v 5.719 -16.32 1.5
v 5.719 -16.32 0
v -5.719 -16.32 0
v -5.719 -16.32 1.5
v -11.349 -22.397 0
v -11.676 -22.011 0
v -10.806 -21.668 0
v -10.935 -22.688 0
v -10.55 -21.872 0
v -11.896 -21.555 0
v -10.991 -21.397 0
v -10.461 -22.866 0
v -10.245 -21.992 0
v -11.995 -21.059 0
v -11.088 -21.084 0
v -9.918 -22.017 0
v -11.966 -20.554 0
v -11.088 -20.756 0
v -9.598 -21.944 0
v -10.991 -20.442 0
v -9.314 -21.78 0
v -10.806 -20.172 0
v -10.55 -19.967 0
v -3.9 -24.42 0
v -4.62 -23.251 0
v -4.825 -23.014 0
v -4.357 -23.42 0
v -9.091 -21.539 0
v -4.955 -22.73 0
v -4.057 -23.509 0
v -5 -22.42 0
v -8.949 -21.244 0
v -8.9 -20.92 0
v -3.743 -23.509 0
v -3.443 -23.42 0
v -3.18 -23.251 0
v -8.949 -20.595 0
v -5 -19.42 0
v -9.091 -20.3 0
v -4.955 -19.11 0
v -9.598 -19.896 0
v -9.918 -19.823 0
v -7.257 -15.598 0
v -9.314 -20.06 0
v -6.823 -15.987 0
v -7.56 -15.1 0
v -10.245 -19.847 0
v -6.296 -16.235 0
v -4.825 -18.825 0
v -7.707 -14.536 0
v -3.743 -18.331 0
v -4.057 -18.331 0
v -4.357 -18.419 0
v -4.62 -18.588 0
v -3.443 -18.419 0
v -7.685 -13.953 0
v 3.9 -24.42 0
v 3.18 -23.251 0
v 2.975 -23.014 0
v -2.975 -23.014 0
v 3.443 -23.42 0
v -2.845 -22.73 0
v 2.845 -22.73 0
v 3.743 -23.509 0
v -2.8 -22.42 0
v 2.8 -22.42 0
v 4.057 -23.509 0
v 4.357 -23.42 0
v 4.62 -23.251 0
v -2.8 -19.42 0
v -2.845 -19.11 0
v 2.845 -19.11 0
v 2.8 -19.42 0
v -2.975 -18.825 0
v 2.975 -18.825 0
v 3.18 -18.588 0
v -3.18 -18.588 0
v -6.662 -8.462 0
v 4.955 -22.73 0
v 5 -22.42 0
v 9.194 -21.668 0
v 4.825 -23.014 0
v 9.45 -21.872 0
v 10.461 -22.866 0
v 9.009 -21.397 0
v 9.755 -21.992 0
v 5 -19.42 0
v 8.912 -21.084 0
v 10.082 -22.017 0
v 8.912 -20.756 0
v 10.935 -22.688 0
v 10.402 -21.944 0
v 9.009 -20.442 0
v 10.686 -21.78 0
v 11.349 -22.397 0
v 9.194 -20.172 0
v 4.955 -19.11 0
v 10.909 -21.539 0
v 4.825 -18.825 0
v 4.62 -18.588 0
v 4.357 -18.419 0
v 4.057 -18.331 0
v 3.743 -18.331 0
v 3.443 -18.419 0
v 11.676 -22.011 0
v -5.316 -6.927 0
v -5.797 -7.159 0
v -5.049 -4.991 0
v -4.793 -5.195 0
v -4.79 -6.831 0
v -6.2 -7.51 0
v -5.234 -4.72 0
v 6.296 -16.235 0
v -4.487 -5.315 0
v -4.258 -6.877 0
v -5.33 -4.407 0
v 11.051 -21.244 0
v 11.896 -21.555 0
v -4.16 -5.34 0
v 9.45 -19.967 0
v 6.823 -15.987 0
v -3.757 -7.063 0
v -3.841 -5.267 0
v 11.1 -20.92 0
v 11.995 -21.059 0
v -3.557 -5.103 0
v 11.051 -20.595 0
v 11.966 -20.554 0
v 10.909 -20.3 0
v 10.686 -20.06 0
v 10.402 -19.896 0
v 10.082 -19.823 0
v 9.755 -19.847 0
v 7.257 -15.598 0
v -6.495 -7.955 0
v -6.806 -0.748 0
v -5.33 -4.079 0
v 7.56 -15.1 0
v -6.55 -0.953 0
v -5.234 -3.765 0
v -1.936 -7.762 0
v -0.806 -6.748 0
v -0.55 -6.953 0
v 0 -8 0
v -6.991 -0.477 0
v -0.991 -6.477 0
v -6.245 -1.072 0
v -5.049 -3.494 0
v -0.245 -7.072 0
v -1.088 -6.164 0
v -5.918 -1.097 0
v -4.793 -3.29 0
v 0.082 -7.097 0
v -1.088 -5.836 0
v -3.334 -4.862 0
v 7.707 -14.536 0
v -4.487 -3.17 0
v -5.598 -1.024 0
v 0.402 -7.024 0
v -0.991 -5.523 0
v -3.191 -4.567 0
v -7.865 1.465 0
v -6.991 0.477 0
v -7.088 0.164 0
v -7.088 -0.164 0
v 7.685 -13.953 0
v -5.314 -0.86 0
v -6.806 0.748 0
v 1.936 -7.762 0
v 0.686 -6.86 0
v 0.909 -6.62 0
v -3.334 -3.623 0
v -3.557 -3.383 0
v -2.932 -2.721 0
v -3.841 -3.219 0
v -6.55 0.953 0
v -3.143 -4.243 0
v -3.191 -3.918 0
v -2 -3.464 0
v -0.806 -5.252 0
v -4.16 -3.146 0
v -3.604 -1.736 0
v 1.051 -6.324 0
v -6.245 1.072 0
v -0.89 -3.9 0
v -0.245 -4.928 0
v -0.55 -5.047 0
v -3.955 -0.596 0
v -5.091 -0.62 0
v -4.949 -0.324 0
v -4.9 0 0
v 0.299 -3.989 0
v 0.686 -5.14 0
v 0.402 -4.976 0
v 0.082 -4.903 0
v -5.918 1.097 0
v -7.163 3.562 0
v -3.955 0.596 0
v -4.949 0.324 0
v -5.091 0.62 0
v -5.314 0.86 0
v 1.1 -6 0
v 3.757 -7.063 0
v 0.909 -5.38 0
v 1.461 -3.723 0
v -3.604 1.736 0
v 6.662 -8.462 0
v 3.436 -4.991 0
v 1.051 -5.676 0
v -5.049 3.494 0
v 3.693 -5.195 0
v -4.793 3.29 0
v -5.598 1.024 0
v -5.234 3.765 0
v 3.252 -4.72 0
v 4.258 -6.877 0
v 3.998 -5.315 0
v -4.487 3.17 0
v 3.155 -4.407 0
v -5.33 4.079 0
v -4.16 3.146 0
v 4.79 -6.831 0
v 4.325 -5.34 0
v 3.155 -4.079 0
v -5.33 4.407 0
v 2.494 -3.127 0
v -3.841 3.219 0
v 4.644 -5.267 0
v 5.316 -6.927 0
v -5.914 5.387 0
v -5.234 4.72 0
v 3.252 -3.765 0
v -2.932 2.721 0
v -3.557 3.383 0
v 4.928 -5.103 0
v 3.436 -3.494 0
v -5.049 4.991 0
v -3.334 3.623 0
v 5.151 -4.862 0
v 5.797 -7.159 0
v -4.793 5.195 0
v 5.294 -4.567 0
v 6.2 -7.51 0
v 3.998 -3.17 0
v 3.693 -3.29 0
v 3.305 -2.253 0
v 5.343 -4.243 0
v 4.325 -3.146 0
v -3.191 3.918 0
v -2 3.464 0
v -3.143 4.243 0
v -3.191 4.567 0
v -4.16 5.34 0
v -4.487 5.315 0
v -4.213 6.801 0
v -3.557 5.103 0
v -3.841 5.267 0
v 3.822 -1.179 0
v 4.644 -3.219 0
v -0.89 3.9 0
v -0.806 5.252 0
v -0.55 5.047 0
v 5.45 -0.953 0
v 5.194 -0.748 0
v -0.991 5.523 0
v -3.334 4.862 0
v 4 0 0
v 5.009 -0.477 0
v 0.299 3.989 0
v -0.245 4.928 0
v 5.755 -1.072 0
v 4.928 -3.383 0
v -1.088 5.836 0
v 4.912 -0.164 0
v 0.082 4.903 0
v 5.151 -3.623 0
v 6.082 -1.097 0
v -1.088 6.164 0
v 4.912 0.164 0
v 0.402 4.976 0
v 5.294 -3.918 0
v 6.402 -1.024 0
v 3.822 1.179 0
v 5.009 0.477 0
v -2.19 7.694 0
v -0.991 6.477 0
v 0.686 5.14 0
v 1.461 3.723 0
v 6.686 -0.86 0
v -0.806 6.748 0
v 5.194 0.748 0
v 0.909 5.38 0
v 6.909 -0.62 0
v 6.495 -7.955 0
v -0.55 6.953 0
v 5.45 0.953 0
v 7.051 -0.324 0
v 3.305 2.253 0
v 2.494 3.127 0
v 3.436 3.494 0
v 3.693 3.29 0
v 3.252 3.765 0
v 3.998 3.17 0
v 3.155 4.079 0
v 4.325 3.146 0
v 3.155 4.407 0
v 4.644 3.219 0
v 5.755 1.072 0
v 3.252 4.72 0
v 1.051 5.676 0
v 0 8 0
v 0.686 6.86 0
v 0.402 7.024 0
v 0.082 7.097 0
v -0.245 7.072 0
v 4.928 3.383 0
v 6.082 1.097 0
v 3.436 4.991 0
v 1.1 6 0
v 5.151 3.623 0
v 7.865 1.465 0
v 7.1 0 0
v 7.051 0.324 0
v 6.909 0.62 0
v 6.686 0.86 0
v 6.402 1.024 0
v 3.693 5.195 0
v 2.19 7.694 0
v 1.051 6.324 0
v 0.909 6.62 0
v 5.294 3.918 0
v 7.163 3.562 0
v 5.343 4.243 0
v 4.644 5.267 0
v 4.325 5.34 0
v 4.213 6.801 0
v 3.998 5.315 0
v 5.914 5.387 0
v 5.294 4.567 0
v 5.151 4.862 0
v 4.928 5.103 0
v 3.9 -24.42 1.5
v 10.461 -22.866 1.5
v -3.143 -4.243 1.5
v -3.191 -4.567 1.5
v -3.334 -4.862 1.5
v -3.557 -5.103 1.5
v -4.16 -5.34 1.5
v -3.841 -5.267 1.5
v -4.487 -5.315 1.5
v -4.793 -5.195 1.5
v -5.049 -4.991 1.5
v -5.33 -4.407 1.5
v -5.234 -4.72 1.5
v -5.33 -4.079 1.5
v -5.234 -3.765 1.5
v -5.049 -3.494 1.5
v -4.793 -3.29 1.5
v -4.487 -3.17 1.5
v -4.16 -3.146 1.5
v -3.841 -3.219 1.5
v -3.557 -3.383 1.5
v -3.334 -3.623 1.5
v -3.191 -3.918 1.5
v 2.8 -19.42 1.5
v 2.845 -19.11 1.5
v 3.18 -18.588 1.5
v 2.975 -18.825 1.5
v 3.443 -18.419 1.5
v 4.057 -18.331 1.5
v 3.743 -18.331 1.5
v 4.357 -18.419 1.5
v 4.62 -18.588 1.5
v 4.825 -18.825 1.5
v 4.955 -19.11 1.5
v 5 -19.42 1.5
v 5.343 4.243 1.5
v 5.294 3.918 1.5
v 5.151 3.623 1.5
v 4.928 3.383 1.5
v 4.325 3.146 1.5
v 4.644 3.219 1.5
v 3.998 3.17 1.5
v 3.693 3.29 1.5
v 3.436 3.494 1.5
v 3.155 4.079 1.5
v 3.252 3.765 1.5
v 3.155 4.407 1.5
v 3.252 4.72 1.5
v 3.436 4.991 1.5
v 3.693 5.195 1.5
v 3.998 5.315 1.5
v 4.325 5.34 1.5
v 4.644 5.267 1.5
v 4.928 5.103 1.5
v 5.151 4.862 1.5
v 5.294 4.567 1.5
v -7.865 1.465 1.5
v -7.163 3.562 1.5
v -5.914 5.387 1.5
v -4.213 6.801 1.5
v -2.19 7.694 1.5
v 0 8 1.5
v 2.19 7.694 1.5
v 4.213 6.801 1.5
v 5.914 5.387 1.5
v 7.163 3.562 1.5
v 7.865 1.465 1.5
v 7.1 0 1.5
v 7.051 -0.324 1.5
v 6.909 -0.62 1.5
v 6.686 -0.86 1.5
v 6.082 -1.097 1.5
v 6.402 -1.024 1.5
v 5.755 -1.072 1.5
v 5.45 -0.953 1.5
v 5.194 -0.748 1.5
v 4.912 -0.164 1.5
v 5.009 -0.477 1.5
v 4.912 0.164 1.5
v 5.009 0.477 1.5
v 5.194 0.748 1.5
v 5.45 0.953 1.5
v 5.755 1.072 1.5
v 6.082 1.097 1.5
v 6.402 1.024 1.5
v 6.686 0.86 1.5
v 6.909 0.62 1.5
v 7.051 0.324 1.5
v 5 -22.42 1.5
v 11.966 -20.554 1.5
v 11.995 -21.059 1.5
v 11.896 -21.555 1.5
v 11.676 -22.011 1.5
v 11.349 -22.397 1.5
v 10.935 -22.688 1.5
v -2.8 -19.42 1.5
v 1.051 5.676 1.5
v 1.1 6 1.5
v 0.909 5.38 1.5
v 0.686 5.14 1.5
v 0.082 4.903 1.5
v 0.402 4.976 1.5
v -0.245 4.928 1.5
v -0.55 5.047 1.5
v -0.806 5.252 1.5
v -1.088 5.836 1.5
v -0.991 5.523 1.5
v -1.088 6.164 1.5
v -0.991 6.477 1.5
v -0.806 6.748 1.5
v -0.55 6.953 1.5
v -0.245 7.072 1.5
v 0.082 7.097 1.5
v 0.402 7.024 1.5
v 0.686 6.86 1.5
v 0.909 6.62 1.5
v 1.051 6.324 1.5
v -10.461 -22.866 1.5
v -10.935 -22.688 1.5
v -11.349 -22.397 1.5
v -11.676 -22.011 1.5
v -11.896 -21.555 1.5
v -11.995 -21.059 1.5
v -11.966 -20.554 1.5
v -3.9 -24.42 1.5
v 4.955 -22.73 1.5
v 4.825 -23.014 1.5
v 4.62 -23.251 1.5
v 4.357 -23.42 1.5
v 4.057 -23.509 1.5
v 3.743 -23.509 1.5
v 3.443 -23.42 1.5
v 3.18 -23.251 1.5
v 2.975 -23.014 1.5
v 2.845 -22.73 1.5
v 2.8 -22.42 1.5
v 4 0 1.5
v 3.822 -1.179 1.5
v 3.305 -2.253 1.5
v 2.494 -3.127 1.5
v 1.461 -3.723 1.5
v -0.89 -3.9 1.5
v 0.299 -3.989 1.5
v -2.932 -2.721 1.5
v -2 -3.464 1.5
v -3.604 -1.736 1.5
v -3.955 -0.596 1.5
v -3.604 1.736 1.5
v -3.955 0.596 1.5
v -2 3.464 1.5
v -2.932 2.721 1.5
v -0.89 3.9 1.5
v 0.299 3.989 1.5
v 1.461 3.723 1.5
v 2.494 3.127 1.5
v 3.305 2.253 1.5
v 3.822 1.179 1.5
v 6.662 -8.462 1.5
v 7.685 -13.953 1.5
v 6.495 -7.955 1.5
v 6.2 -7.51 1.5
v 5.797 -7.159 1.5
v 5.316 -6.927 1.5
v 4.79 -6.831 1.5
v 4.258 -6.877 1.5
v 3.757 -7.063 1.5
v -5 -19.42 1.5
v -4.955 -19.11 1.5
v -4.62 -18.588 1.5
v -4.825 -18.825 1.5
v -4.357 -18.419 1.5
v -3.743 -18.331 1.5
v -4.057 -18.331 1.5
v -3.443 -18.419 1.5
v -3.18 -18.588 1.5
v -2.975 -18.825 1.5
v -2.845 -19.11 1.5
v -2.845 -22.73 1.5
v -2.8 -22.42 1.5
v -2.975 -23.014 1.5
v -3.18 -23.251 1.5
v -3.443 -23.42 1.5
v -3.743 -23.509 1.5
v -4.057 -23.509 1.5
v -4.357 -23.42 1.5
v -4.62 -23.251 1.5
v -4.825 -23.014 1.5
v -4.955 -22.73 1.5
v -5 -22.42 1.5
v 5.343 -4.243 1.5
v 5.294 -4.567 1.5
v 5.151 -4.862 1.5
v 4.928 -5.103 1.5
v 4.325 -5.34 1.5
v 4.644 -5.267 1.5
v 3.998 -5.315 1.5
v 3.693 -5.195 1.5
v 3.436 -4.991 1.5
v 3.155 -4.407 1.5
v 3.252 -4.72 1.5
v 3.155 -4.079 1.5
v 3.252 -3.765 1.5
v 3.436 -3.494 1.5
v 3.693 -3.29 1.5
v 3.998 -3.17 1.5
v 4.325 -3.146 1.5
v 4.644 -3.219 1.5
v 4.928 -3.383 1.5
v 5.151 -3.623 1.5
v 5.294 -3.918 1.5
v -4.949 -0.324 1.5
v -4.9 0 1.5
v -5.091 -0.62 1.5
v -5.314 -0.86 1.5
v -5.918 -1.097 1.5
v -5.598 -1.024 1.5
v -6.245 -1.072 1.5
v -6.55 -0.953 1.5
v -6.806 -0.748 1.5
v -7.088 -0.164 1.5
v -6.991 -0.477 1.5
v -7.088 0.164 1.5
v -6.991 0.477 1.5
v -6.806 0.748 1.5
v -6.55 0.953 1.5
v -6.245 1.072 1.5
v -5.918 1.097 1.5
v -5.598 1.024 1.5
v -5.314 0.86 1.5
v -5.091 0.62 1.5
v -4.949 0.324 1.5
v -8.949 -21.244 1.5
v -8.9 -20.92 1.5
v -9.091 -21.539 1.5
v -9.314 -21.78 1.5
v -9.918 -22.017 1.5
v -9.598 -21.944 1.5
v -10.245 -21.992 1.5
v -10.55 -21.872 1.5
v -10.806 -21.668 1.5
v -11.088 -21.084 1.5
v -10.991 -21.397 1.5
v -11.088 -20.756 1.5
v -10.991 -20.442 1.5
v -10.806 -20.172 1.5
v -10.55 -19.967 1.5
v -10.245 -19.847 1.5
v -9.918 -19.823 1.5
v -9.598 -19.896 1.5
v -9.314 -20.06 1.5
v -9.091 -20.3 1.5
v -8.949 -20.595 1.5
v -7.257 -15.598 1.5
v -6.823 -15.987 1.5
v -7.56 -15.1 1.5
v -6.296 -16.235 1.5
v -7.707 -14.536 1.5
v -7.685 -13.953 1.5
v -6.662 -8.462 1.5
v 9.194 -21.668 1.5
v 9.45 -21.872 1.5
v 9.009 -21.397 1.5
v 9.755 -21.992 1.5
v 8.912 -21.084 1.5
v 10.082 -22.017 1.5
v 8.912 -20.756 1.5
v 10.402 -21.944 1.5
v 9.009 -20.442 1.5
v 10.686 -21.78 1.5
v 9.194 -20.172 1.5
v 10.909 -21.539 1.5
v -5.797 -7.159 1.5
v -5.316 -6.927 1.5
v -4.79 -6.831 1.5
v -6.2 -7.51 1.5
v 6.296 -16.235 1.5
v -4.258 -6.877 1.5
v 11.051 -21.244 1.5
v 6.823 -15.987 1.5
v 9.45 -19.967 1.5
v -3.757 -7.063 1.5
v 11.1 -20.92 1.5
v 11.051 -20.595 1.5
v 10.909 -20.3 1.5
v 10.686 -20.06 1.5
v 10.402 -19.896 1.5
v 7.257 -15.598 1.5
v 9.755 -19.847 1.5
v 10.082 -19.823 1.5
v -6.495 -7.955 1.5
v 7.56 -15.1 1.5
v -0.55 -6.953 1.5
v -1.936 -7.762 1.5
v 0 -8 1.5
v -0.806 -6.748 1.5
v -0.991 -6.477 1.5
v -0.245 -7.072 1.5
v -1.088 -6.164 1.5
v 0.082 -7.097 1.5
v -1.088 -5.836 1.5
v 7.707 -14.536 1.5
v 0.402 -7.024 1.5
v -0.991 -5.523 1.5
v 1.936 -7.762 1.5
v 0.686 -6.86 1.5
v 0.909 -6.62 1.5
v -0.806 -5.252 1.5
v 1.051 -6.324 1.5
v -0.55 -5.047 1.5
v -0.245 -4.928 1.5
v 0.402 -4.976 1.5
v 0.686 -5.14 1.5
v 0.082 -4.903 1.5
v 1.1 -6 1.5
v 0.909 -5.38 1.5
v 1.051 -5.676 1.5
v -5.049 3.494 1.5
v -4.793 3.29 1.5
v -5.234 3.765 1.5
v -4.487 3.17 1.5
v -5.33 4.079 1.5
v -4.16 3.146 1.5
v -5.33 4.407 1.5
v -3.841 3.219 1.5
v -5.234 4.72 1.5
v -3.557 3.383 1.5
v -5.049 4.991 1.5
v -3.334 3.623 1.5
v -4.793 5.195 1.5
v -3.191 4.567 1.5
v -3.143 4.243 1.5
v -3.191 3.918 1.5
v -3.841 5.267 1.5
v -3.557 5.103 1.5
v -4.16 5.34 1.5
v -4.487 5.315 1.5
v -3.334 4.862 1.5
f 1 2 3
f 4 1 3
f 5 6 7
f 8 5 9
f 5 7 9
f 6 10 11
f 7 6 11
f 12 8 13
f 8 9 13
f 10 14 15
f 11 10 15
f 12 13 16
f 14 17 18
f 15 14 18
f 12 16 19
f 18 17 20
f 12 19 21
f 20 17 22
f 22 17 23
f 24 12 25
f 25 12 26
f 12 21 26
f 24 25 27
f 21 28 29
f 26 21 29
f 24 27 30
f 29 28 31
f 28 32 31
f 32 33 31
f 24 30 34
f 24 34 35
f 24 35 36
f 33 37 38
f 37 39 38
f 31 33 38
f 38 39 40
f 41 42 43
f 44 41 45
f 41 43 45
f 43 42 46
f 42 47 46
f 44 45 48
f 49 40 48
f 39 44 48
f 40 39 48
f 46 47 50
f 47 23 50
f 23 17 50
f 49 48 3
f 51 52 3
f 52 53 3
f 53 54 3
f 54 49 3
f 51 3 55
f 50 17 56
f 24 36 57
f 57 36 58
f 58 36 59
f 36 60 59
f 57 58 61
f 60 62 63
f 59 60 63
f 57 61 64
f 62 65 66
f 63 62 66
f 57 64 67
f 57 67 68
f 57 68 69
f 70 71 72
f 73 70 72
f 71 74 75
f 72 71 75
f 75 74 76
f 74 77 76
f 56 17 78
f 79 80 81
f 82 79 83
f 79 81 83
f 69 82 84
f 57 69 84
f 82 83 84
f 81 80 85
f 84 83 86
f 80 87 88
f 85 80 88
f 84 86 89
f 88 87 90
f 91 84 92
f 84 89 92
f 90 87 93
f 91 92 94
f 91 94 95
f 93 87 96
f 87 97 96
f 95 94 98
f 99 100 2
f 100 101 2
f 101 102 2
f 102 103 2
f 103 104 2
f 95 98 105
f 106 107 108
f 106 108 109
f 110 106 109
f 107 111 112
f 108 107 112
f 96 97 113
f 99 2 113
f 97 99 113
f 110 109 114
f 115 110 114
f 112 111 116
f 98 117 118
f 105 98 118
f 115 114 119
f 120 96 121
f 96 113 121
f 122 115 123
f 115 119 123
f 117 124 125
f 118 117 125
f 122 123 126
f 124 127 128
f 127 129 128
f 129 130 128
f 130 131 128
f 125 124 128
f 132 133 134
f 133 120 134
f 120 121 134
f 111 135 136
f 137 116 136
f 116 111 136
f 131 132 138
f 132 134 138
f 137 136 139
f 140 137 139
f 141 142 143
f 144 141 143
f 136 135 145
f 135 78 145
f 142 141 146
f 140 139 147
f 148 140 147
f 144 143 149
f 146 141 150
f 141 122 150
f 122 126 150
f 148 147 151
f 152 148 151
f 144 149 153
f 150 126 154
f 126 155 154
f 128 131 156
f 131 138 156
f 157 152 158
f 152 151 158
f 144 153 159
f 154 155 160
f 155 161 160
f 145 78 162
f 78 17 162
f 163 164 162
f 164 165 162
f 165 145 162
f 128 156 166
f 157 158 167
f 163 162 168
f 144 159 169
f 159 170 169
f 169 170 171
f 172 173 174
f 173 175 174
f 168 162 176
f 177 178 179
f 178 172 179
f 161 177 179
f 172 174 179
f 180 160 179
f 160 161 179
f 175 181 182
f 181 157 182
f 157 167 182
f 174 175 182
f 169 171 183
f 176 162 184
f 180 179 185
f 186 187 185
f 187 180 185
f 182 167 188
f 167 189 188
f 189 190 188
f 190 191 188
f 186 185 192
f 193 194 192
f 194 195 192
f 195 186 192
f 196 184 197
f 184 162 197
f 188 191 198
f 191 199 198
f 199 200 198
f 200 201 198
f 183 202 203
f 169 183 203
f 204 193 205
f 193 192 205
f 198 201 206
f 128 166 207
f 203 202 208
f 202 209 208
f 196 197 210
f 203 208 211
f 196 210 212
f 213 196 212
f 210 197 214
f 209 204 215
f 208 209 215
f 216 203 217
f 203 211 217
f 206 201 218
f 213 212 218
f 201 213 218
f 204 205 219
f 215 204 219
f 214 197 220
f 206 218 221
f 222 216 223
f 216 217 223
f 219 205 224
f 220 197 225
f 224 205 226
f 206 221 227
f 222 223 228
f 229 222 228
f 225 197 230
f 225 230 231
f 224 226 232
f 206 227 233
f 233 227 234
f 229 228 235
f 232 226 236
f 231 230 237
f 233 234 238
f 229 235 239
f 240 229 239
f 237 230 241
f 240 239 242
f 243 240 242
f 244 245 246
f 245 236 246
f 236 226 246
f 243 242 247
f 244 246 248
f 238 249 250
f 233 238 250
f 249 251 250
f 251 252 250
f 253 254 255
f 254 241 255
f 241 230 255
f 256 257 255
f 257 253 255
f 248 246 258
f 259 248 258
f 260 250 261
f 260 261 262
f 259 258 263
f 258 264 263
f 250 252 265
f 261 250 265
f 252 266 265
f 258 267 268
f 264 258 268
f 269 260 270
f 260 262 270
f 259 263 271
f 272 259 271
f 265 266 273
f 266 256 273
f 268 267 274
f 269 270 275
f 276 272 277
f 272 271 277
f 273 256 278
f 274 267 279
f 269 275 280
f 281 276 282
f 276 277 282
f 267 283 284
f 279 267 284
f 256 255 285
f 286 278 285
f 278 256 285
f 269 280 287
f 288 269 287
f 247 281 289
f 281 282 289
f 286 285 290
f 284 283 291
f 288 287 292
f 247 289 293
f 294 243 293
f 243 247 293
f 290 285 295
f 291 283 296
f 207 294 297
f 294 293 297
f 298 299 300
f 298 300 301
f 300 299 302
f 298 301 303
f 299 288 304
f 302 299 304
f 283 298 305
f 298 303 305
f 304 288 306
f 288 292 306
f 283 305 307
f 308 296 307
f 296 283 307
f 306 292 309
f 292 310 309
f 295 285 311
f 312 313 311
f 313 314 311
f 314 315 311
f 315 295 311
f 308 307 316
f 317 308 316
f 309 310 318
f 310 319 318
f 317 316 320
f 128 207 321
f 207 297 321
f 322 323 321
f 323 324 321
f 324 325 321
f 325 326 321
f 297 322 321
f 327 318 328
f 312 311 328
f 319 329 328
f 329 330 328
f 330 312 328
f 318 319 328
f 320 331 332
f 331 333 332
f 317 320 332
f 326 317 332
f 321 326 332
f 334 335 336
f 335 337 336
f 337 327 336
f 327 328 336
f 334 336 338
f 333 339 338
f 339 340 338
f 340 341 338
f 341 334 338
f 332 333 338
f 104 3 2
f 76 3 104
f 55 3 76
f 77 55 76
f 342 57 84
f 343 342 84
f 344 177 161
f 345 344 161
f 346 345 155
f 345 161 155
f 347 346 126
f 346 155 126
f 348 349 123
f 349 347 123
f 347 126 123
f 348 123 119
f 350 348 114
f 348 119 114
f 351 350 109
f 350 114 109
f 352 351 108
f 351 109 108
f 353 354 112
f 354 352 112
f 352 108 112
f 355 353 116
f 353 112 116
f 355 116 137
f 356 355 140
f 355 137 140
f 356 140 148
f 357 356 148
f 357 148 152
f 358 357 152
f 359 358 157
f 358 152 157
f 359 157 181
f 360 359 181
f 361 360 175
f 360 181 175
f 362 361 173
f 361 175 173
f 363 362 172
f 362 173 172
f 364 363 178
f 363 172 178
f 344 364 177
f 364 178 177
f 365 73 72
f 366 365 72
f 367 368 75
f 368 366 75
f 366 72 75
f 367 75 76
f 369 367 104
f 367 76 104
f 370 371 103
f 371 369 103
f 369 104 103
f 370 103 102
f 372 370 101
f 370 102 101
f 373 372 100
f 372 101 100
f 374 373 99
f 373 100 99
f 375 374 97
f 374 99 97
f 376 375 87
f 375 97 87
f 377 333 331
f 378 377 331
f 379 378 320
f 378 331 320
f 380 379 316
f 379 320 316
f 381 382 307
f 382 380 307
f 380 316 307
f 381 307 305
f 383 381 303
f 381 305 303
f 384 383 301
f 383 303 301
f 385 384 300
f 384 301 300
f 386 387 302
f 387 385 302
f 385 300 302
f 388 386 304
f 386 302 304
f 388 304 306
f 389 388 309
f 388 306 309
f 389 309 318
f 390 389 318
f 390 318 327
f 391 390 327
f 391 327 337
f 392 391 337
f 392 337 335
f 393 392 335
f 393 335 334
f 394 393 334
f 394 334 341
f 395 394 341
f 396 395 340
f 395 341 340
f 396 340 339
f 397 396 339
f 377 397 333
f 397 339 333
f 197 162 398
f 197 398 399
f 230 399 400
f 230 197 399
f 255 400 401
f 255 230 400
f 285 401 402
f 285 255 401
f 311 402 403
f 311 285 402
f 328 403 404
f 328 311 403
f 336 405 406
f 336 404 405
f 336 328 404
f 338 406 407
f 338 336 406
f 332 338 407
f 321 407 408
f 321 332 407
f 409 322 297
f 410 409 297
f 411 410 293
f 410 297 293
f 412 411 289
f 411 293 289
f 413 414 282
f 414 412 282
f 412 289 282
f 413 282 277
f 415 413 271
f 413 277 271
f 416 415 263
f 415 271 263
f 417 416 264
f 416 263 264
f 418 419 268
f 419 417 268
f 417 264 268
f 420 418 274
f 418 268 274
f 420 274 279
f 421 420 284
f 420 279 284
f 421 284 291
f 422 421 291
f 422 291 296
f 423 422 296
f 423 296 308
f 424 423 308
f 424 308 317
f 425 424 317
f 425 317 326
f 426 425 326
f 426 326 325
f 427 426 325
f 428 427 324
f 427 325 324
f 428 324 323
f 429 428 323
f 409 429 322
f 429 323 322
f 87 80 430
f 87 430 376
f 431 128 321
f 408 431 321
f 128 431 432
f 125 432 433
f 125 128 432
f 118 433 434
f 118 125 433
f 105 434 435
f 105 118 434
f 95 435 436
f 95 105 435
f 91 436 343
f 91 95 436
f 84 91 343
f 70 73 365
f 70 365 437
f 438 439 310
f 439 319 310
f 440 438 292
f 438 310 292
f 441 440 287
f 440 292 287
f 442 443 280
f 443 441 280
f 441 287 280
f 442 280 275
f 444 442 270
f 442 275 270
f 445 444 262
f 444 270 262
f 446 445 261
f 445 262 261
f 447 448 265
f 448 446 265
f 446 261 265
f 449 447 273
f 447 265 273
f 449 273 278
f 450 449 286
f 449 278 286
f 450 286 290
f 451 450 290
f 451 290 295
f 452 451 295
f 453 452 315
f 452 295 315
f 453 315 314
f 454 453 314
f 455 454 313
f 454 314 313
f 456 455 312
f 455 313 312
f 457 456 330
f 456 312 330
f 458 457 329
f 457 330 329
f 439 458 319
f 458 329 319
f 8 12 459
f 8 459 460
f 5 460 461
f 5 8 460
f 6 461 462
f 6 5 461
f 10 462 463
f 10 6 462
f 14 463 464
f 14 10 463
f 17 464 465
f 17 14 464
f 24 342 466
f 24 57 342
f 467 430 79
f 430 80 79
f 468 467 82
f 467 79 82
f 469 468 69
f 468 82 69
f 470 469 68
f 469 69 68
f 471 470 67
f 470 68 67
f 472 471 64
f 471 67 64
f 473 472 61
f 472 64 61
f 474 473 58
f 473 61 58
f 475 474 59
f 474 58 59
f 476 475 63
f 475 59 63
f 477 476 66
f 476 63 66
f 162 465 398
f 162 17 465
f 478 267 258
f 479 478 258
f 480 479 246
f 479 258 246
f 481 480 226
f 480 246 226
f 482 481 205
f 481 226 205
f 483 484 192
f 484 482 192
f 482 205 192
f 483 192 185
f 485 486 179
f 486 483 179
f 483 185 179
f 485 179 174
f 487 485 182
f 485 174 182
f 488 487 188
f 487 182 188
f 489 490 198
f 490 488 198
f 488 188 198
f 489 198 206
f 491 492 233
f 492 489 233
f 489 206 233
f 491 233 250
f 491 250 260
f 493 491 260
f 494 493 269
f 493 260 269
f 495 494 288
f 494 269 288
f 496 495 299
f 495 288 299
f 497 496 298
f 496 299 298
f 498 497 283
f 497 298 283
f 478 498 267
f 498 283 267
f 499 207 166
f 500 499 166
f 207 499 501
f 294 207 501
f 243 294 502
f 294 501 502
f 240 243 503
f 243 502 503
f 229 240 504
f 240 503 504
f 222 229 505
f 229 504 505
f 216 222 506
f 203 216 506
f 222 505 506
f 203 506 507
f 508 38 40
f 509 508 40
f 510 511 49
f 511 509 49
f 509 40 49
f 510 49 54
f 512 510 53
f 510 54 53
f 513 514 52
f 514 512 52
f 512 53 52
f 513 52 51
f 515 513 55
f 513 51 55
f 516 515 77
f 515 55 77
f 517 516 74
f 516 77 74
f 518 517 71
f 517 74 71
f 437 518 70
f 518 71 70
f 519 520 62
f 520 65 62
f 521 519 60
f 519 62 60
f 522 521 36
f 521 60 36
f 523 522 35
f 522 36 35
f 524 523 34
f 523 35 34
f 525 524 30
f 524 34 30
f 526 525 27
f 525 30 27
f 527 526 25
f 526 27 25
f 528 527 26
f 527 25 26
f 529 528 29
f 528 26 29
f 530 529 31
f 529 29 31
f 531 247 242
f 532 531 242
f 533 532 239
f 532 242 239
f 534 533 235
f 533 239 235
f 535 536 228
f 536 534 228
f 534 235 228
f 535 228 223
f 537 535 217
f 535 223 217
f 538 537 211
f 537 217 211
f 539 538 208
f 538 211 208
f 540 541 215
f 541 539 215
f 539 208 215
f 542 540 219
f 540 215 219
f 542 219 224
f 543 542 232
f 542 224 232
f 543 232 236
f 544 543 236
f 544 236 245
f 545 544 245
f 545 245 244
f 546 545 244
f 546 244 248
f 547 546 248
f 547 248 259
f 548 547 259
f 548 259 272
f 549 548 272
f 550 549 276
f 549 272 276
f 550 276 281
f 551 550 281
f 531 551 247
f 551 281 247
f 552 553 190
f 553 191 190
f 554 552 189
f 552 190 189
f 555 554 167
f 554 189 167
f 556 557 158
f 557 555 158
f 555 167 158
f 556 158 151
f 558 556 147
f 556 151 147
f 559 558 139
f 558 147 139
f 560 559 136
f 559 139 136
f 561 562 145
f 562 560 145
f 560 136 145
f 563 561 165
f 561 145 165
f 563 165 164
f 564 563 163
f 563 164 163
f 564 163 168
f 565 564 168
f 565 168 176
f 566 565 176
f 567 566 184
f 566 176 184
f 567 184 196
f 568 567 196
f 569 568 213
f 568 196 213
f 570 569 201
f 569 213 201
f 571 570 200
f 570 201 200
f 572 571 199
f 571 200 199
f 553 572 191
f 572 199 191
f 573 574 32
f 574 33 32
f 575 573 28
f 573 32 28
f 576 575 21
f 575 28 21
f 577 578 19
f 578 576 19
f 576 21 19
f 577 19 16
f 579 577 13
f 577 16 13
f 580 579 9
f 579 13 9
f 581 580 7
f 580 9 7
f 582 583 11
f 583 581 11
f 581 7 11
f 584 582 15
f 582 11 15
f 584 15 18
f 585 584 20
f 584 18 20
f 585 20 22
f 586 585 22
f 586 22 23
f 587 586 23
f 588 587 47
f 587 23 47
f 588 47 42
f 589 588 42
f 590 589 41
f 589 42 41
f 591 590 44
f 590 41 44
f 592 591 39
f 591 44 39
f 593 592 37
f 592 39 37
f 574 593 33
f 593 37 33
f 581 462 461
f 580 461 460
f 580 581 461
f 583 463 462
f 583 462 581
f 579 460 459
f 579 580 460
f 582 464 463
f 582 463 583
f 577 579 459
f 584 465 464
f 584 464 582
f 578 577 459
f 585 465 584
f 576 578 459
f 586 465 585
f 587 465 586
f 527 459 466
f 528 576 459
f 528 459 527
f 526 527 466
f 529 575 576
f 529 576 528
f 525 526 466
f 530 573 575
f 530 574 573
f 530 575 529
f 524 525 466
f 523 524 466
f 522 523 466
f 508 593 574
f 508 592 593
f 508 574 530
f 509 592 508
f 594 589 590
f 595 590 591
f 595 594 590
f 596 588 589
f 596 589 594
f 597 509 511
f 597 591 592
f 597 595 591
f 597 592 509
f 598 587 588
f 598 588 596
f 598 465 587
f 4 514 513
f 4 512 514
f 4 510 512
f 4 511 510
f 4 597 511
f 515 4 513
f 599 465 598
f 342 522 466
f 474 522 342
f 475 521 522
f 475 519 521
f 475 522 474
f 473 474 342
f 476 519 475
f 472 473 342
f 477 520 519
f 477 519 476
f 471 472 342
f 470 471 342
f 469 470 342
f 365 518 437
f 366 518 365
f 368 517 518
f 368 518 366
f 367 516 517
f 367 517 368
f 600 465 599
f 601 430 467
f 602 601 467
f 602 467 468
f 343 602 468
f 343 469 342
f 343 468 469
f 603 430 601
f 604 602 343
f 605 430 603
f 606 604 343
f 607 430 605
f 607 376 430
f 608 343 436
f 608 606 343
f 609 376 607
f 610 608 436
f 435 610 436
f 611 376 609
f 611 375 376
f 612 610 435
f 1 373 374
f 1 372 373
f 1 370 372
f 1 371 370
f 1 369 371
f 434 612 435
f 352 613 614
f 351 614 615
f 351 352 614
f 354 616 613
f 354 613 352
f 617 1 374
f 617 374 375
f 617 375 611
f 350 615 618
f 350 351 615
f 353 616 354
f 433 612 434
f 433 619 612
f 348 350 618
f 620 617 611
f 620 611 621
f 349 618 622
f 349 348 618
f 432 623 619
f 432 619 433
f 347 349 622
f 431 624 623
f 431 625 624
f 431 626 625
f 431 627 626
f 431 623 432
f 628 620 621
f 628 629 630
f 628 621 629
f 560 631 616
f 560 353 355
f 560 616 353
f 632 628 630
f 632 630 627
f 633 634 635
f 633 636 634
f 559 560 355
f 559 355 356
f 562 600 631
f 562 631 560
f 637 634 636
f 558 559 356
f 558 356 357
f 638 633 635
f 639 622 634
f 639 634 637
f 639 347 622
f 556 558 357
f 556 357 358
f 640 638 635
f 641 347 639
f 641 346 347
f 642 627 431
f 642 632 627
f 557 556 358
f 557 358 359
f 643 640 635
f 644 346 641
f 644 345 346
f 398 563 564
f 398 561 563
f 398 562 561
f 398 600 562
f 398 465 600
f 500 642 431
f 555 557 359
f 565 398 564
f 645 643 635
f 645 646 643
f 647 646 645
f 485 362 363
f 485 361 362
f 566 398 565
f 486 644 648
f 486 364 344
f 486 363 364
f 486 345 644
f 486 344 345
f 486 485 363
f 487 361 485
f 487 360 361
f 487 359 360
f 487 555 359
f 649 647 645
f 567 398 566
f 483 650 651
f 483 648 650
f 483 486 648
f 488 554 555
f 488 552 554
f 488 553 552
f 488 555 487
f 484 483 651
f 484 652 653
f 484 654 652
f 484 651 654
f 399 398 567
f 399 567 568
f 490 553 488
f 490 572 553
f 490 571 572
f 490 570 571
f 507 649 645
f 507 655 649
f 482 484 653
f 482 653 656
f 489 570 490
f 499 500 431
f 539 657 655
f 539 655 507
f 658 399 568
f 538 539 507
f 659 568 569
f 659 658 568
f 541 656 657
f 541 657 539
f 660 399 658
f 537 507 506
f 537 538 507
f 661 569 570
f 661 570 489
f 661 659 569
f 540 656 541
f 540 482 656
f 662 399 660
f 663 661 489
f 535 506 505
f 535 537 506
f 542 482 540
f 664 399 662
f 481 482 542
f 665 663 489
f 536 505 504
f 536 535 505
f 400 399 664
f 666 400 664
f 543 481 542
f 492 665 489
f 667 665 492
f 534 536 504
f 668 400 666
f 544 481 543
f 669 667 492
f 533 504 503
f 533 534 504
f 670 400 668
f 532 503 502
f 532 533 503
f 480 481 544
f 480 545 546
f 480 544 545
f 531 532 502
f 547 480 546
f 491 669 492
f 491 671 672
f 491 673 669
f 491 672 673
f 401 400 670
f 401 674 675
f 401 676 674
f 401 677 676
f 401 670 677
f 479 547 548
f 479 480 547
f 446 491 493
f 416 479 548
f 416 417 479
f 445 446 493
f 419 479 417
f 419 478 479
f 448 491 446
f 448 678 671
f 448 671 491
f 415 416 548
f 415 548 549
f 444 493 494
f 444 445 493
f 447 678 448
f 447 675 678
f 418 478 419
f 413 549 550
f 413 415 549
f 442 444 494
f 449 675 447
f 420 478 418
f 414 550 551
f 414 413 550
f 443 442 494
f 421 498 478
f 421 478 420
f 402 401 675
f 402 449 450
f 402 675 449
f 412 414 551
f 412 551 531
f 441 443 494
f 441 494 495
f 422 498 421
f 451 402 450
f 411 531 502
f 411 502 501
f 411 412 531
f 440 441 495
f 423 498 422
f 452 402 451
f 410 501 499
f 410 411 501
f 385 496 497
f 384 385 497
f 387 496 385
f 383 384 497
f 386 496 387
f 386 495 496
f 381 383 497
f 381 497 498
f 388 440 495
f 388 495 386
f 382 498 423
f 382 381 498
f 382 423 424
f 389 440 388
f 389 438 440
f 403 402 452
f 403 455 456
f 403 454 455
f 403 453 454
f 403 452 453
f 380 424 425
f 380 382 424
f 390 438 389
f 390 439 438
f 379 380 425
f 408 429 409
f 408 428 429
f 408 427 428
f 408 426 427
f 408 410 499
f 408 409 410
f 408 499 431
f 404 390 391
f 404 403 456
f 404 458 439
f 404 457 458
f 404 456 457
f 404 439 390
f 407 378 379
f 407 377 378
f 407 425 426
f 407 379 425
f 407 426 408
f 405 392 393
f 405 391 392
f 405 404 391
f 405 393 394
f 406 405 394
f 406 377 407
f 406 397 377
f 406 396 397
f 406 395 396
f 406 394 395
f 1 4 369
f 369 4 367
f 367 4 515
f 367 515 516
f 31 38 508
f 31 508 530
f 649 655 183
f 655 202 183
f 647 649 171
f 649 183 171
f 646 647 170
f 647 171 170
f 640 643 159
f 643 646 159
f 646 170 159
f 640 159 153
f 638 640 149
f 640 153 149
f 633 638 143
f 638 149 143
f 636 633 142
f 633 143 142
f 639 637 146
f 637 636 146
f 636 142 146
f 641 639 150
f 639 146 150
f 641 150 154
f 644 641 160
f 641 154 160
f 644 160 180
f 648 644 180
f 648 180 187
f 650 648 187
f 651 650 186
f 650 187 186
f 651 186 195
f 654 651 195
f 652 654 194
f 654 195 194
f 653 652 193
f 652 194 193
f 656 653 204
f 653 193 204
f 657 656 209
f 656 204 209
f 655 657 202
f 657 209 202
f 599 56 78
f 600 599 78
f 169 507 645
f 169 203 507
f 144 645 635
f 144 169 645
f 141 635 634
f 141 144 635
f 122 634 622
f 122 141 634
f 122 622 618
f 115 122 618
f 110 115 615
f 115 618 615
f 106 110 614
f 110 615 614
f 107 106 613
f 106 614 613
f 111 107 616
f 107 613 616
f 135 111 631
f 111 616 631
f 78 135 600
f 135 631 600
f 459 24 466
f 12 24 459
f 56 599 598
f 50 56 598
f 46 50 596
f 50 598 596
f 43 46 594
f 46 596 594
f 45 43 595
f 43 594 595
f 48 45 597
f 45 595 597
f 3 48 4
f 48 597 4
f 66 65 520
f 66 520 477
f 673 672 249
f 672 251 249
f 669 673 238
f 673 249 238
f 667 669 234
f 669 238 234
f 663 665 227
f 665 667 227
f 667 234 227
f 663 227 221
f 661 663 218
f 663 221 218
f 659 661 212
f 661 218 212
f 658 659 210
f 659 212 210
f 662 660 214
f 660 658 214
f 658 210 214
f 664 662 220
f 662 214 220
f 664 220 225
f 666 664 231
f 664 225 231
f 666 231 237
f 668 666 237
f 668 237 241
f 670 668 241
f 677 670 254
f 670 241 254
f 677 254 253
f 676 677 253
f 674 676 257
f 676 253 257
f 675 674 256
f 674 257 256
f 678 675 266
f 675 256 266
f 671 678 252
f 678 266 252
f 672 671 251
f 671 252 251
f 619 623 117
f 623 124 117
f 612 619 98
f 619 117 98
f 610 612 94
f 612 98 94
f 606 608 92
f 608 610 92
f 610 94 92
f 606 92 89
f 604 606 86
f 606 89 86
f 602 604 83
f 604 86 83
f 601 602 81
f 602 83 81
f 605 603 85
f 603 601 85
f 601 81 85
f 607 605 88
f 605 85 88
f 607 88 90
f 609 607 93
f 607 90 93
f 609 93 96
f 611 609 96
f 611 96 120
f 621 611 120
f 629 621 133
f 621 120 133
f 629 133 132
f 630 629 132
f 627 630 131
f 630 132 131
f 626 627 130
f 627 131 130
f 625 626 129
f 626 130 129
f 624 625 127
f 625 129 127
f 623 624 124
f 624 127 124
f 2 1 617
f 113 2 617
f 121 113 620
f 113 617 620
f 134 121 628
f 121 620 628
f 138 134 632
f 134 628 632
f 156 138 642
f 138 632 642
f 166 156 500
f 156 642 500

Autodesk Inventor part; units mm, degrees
ref_plane "YZ Plane" through (0, 0, 0) normal (1, 0, 0) x (0, 1, 0)
ref_plane "XZ Plane" through (0, 0, 0) normal (0, 1, 0) x (-1, 0, 0)
ref_plane "XY Plane" through (0, 0, 0) normal (0, 0, 1) x (1, 0, 0)
sketch "スケッチ1" plane through (0, 0, 0) normal (0, 0, 1) x (1, 0, 0)
  circle A0 centre (0, 0) radius 4
  circle A1 centre (0, 0) radius 8
  circle A2 centre (0, 0) radius 6 construction
  circle A3 centre (0, 6) radius 1.1
  circle A4 centre (-4.2426, 4.2426) radius 1.1
  circle A5 centre (-6, 0) radius 1.1
  circle A6 centre (-4.2426, -4.2426) radius 1.1
  circle A7 centre (0, -6) radius 1.1
  circle A8 centre (4.2426, -4.2426) radius 1.1
  circle A9 centre (6, 0) radius 1.1
  circle A10 centre (4.2426, 4.2426) radius 1.1
  arc A11 (8.483, -10.1137) -> (9.4351, -9.068) centre (8.4362, -9.1148) ccw projected
  circle A12 centre (0, 0) radius 13.4197 construction
  circle A13 centre (0, 0) radius 19.4197 construction
  line L0 (5, -19.4197) -> (-5, -19.4197)
  line L1 (-5, -19.4197) -> (-5, -22.4197)
  line L2 (-5, -22.4197) -> (5, -22.4197)
  line L3 (5, -22.4197) -> (5, -19.4197)
  circle A14 centre (3.9, -19.4197) radius 1.1
  line L4 (0, -19.4197) -> (0, -22.4197) construction
  line L5 (0, -20.9197) -> (5, -20.9197) construction
  circle A15 centre (3.9, -22.4197) radius 1.1
  circle A16 centre (-3.9, -19.4197) radius 1.1
  circle A17 centre (-3.9, -22.4197) radius 1.1
  circle A18 centre (10, -20.9197) radius 1.1
  circle A19 centre (-10, -20.9197) radius 1.1
  circle A20 centre (10, -20.9197) radius 2
  circle A21 centre (-10, -20.9197) radius 2
  line L6 (11.9662, -20.5535) -> (7.8647, 1.465)
  line L7 (-11.9662, -20.5535) -> (-7.8647, 1.465)
  circle A22 centre (3.9, -22.4197) radius 2
  circle A23 centre (-3.9, -22.4197) radius 2
  line L8 (3.9, -24.4197) -> (-3.9, -24.4197)
  line L9 (-3.9, -24.4197) -> (-10.4609, -22.8659)
  line L10 (3.9, -24.4197) -> (10.4609, -22.8659)
  point P0 (-5, -19.4197)
  point P1 (-2.8, -19.4197)
  point P2 (2.8, -19.4197)
  point P3 (5, -22.4197)
  point P4 (2.8, -22.4197)
  point P5 (-5, -22.4197)
  point P6 (-5, -22.4197)
  point P7 (-7.8647, 1.465)
  point P8 (-11.9662, -20.5535)
  point P9 (-2.8, -22.4197)
  dimension "d1" = 16
  dimension "d2" = 12
  dimension "d13" = 2.2
  dimension "d17" = 4
  dimension "d18" = 4
  dimension "d19" = 4
  dimension "d0" = 8
  dimension "d3" = 2.2
  dimension "d6" = 360
  dimension "d10" = 6
  dimension "d11" = 10
  dimension "d12" = 3
  dimension "d14" = 2.2
  dimension "d15" = 5
  dimension "d16" = 4
extrude "押し出し1" add sketch "スケッチ1" along normal blind 1.5 contours A1 | A1 L6 A20 L10 A22 L3 A14 L0 A16 L1 A23 L9 A21 L7 | A20 | A21 | L10 A22 L2 A15 L3 | A23 L1 A17 L2 L9 | L8 A23 L2 A22
sketch "スケッチ2" plane through (0, 0, 0) normal (0, 0, -1) x (-1, 0, 0)
  circle A0 centre (0, 0) radius 8
  arc A1 (7.8647, 1.465) -> (-7.8647, 1.465) centre (0, 0) ccw projected
  line L0 (-8.1259, -16.3197) -> (8.1259, -16.3197)
  line L1 (8.1259, -16.3197) -> (6.0591, -5.2238)
  line L2 (-6.0591, -5.2238) -> (-8.1259, -16.3197)
  line L3 (7.8647, 1.465) -> (11.9662, -20.5535) projected
  line L4 (-11.9662, -20.5535) -> (-7.8647, 1.465) projected
  arc A2 (-2.8, -19.4197) -> (-5, -19.4197) centre (-3.9, -19.4197) ccw projected
  point P0 (9.9154, -9.5443)
  point P1 (-3.9, -18.3197)
  dimension "d20" = 3
  dimension "d21" = 3
  dimension "d22" = 2
extrude "押し出し2" cut sketch "スケッチ2" against normal through all contours L1 L0 L2 A0
fillet "フィレット1" radius 2 4 edges at (6.0591, -5.2238, 0.75) (-6.0591, -5.2238, 0.75) (-8.1259, -16.3197, 0.75) (8.1259, -16.3197, 0.75)
equation "\"d21\" = d20"
properties part number "mataroll" material "アルミニウム 2014-T4"
